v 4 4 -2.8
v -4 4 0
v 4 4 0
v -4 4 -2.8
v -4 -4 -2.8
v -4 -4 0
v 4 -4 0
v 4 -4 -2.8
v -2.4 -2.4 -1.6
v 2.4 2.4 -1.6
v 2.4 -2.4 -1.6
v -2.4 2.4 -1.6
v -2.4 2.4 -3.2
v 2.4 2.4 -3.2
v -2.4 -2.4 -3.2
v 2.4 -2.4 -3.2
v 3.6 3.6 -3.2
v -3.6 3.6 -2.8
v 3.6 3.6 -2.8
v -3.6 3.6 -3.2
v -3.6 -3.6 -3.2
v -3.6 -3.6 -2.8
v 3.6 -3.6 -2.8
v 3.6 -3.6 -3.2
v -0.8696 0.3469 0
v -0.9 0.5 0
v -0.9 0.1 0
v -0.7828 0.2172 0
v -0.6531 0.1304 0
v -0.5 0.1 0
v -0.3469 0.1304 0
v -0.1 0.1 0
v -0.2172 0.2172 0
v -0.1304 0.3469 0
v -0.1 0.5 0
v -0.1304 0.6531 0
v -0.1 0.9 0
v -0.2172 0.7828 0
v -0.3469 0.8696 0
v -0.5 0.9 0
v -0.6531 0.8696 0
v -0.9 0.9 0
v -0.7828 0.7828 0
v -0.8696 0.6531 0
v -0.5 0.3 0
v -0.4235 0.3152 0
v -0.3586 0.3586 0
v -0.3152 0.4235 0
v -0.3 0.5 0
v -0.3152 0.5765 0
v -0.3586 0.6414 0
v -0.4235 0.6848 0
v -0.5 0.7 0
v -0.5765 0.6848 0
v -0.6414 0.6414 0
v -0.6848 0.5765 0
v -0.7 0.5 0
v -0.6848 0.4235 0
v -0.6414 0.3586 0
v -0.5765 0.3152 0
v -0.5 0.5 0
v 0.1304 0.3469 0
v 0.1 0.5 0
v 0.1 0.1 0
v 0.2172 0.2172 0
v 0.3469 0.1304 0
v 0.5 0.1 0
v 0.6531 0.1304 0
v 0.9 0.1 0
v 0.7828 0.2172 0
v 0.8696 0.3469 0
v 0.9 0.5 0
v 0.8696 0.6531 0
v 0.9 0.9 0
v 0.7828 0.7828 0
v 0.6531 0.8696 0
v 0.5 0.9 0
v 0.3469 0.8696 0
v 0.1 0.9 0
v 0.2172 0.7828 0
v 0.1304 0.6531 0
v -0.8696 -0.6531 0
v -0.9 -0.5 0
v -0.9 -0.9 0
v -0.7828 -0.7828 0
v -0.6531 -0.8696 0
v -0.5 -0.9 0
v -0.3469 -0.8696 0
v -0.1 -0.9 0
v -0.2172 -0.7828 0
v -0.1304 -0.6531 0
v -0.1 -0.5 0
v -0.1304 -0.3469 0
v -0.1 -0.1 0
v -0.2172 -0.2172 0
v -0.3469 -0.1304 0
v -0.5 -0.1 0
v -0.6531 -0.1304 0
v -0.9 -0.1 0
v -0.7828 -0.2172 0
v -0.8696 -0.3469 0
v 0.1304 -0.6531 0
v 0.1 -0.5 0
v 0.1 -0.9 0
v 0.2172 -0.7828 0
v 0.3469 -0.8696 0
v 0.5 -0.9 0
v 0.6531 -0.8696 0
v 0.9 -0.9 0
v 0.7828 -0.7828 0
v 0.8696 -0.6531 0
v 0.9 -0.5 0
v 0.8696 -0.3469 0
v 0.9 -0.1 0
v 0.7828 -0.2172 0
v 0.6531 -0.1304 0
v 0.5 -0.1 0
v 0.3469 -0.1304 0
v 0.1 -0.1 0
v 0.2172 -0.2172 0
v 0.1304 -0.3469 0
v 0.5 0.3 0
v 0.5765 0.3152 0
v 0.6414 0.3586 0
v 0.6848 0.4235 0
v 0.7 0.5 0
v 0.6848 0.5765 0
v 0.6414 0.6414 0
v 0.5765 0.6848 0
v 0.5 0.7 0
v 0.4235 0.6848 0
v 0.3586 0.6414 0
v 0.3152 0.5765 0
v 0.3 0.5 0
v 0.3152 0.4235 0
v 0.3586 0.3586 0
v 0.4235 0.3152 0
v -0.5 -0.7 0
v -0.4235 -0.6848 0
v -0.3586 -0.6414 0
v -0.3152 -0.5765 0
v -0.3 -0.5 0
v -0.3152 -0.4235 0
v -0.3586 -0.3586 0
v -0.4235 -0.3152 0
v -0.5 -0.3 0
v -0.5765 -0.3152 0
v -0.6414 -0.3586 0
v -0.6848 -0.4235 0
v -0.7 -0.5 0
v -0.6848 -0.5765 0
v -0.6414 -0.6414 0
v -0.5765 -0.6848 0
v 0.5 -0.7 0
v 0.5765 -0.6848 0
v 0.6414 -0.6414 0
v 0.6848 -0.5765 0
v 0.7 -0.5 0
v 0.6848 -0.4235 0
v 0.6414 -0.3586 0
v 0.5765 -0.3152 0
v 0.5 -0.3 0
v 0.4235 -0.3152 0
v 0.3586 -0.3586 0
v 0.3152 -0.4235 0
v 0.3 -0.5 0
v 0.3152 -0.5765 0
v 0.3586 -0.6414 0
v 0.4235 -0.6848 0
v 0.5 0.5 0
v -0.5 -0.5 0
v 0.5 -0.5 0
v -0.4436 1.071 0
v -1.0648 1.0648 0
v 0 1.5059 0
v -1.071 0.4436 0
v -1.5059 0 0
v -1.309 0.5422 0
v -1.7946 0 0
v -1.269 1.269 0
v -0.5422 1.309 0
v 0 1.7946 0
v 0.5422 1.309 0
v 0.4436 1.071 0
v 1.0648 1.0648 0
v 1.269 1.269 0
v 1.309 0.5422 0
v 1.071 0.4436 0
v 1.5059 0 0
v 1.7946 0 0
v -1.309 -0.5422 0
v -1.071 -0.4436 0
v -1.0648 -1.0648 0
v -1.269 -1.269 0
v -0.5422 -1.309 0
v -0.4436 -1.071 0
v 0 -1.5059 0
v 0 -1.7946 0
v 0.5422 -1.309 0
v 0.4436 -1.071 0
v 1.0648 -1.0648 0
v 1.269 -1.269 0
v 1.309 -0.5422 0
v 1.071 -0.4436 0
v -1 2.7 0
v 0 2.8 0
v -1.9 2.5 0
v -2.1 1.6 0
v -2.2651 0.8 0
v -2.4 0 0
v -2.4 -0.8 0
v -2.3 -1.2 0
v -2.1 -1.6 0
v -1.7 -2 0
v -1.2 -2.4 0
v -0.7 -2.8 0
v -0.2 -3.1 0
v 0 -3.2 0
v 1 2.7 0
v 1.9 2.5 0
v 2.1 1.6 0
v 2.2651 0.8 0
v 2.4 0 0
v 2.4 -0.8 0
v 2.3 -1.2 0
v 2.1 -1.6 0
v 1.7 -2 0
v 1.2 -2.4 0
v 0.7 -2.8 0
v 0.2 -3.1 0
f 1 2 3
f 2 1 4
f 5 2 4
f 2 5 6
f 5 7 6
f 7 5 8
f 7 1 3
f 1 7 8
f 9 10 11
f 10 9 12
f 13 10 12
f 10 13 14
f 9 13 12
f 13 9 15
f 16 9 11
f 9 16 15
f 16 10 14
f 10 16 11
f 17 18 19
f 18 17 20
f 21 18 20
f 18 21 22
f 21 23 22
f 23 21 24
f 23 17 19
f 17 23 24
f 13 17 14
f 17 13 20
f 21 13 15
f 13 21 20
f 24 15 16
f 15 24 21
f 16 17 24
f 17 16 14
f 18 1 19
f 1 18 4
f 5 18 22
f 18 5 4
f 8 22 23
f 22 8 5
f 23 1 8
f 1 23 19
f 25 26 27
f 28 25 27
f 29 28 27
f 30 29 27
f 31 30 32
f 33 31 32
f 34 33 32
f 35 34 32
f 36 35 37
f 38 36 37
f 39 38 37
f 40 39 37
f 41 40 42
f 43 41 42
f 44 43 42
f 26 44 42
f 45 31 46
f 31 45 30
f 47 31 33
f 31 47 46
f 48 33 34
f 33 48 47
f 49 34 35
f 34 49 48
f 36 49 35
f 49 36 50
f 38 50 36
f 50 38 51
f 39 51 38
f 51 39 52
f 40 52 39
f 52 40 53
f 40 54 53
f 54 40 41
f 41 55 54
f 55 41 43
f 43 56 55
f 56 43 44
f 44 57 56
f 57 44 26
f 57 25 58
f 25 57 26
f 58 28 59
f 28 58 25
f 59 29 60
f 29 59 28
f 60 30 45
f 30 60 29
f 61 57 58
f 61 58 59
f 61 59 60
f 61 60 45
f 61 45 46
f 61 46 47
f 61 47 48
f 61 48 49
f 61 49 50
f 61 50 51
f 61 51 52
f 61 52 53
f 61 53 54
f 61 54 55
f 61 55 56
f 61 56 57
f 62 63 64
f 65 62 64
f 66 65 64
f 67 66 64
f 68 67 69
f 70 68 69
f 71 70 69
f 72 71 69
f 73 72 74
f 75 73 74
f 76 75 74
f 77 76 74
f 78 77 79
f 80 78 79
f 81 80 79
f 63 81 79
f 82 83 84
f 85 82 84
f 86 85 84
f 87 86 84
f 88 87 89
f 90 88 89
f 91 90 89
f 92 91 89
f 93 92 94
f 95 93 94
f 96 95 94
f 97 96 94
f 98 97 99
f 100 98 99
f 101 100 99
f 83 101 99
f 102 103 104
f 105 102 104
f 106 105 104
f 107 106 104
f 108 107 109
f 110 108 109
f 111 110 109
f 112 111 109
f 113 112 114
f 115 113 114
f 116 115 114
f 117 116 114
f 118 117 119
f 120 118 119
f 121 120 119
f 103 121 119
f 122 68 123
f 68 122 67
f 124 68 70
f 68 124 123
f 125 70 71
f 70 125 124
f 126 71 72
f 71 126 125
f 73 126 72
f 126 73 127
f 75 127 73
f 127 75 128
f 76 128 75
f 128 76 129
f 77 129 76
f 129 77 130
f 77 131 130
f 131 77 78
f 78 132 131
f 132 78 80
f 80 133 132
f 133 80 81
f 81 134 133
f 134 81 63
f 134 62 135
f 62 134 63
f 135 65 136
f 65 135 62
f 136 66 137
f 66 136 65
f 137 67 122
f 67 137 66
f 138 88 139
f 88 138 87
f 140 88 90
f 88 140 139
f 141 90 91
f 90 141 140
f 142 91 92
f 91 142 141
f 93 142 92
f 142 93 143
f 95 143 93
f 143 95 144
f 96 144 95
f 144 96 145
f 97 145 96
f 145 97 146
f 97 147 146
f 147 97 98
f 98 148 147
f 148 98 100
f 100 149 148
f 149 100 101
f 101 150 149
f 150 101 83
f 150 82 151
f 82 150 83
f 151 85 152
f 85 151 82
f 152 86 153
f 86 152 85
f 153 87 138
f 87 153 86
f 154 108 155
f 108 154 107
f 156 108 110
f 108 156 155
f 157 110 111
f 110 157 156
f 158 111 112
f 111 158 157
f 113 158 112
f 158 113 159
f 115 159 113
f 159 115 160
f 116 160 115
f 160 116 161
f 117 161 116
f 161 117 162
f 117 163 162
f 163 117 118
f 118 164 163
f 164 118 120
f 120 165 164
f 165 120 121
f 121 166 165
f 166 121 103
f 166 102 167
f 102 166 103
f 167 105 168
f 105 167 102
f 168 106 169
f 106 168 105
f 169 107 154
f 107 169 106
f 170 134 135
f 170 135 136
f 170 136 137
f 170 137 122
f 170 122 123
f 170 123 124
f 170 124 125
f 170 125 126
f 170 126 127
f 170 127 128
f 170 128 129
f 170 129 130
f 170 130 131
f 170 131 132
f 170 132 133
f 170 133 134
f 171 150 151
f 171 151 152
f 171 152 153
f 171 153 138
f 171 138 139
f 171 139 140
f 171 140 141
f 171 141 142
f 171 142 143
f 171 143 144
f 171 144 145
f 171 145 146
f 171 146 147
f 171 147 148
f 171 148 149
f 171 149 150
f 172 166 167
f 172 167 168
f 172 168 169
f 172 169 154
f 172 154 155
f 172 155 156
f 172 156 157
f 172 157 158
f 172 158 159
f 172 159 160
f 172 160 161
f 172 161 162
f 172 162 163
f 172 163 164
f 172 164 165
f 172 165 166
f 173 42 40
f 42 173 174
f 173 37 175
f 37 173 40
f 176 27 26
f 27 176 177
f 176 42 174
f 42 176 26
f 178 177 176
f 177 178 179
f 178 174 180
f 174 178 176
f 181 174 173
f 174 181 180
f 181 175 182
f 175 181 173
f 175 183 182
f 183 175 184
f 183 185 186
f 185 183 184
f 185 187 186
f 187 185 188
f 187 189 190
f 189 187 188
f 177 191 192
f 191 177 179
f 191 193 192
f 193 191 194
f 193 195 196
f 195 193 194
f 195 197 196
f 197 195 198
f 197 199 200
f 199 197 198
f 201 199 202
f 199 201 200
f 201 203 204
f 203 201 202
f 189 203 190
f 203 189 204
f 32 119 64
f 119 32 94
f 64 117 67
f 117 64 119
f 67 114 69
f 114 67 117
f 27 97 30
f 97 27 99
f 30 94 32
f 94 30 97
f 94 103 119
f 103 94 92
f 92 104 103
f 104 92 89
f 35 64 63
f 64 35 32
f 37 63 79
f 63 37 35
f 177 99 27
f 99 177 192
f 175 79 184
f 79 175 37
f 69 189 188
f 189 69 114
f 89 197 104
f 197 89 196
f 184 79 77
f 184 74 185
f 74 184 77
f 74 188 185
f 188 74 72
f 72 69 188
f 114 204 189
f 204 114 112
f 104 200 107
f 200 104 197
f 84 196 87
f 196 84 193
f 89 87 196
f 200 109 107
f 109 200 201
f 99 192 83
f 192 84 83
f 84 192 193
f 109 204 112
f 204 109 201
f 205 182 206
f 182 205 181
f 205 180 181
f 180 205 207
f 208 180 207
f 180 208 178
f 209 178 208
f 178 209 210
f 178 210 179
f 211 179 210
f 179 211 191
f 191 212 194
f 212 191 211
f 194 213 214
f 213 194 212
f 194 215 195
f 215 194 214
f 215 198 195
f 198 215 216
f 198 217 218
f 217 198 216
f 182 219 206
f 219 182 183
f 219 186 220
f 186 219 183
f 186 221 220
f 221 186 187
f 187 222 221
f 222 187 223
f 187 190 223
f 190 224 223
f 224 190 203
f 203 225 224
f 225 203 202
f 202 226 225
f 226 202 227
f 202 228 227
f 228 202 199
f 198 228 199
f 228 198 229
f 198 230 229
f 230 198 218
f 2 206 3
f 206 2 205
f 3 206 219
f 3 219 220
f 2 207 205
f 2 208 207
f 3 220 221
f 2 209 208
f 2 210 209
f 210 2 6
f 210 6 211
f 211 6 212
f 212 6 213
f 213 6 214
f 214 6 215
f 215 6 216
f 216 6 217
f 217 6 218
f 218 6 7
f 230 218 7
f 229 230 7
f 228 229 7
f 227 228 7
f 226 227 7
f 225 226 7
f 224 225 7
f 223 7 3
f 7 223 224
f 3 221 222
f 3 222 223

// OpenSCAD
// file: ../p/box5.scad
use <../lib.scad>
function ldraw_lib__box5() = [
// 0 Box with 5 Faces and All Edges
// 0 Name: box5.dat
// 0 Author: James Jessiman
// 0 !LDRAW_ORG Primitive UPDATE 2012-01
// 0 !LICENSE Licensed under CC BY 4.0 : see CAreadme.txt
// 
// 0 BFC CERTIFY CCW
  [0,"BFC","CERTIFY"],
  [0,"BFC","CCW"],
// 
// 0 !HISTORY 2002-04-03 [sbliss] Modified for BFC compliance
// 0 !HISTORY 2002-04-25 [PTadmin] Official Update 2002-02
// 0 !HISTORY 2007-06-24 [PTadmin] Header formatted for Contributor Agreement
// 0 !HISTORY 2008-07-01 [PTadmin] Official Update 2008-01
// 0 !HISTORY 2012-02-16 [Philo] Changed to CCW
// 0 !HISTORY 2012-03-30 [PTadmin] Official Update 2012-01
// 
// 
// 2 24 1 1 1 -1 1 1
  [2,24,1,1,1,-1,1,1],
// 2 24 -1 1 1 -1 1 -1
  [2,24,-1,1,1,-1,1,-1],
// 2 24 -1 1 -1 1 1 -1
  [2,24,-1,1,-1,1,1,-1],
// 2 24 1 1 -1 1 1 1
  [2,24,1,1,-1,1,1,1],
// 2 24 1 0 1 -1 0 1
  [2,24,1,0,1,-1,0,1],
// 2 24 -1 0 1 -1 0 -1
  [2,24,-1,0,1,-1,0,-1],
// 2 24 -1 0 -1 1 0 -1
  [2,24,-1,0,-1,1,0,-1],
// 2 24 1 0 -1 1 0 1
  [2,24,1,0,-1,1,0,1],
// 2 24 1 0 1 1 1 1
  [2,24,1,0,1,1,1,1],
// 2 24 -1 0 1 -1 1 1
  [2,24,-1,0,1,-1,1,1],
// 2 24 1 0 -1 1 1 -1
  [2,24,1,0,-1,1,1,-1],
// 2 24 -1 0 -1 -1 1 -1
  [2,24,-1,0,-1,-1,1,-1],
// 4 16 -1 1 1 1 1 1 1 1 -1 -1 1 -1
  [4,16,-1,1,1,1,1,1,1,1,-1,-1,1,-1],
// 4 16 -1 1 1 -1 0 1 1 0 1 1 1 1
  [4,16,-1,1,1,-1,0,1,1,0,1,1,1,1],
// 4 16 -1 1 -1 -1 0 -1 -1 0 1 -1 1 1
  [4,16,-1,1,-1,-1,0,-1,-1,0,1,-1,1,1],
// 4 16 1 1 -1 1 0 -1 -1 0 -1 -1 1 -1
  [4,16,1,1,-1,1,0,-1,-1,0,-1,-1,1,-1],
// 4 16 1 1 1 1 0 1 1 0 -1 1 1 -1
  [4,16,1,1,1,1,0,1,1,0,-1,1,1,-1],
];
module ldraw_lib__box5(step=0, col=false, unit=2/5, alt=false, line=0.2, solid=!$preview)
    makepoly(ldraw_lib__box5(), step=step, col=col, unit=unit, alt=alt, line=line, solid=solid);
ldraw_lib__box5(line=0.2);
// file: ../p/box4.scad
use <../lib.scad>
function ldraw_lib__box4() = [
// 0 Box with 4 Faces (2 Parallel Pairs) and All Edges
// 0 Name: box4.dat
// 0 Author: James Jessiman
// 0 !LDRAW_ORG Primitive UPDATE 2012-01
// 0 !LICENSE Licensed under CC BY 4.0 : see CAreadme.txt
// 
// 0 BFC CERTIFY CCW
  [0,"BFC","CERTIFY"],
  [0,"BFC","CCW"],
// 
// 0 !HISTORY 2002-04-03 [sbliss] Modified for BFC compliance
// 0 !HISTORY 2002-04-25 [PTadmin] Official Update 2002-02
// 0 !HISTORY 2007-06-24 [PTadmin] Header formatted for Contributor Agreement
// 0 !HISTORY 2008-07-01 [PTadmin] Official Update 2008-01
// 0 !HISTORY 2012-02-16 [Philo] Changed to CCW
// 0 !HISTORY 2012-03-30 [PTadmin] Official Update 2012-01
// 
// 
// 2 24 1 1 1 -1 1 1
  [2,24,1,1,1,-1,1,1],
// 2 24 -1 1 1 -1 1 -1
  [2,24,-1,1,1,-1,1,-1],
// 2 24 -1 1 -1 1 1 -1
  [2,24,-1,1,-1,1,1,-1],
// 2 24 1 1 -1 1 1 1
  [2,24,1,1,-1,1,1,1],
// 2 24 1 0 1 -1 0 1
  [2,24,1,0,1,-1,0,1],
// 2 24 -1 0 1 -1 0 -1
  [2,24,-1,0,1,-1,0,-1],
// 2 24 -1 0 -1 1 0 -1
  [2,24,-1,0,-1,1,0,-1],
// 2 24 1 0 -1 1 0 1
  [2,24,1,0,-1,1,0,1],
// 2 24 1 0 1 1 1 1
  [2,24,1,0,1,1,1,1],
// 2 24 -1 0 1 -1 1 1
  [2,24,-1,0,1,-1,1,1],
// 2 24 1 0 -1 1 1 -1
  [2,24,1,0,-1,1,1,-1],
// 2 24 -1 0 -1 -1 1 -1
  [2,24,-1,0,-1,-1,1,-1],
// 4 16 -1 1 1 -1 0 1 1 0 1 1 1 1
  [4,16,-1,1,1,-1,0,1,1,0,1,1,1,1],
// 4 16 -1 1 -1 -1 0 -1 -1 0 1 -1 1 1
  [4,16,-1,1,-1,-1,0,-1,-1,0,1,-1,1,1],
// 4 16 1 1 -1 1 0 -1 -1 0 -1 -1 1 -1
  [4,16,1,1,-1,1,0,-1,-1,0,-1,-1,1,-1],
// 4 16 1 1 1 1 0 1 1 0 -1 1 1 -1
  [4,16,1,1,1,1,0,1,1,0,-1,1,1,-1],
];
module ldraw_lib__box4(step=0, col=false, unit=2/5, alt=false, line=0.2, solid=!$preview)
    makepoly(ldraw_lib__box4(), step=step, col=col, unit=unit, alt=alt, line=line, solid=solid);
ldraw_lib__box4(line=0.2);
// file: ../p/4-4ring1.scad
use <../lib.scad>
function ldraw_lib__4_4ring1() = [
// 0 Ring  1 x 1.0
// 0 Name: 4-4ring1.dat
// 0 Author: James Jessiman
// 0 !LDRAW_ORG Primitive UPDATE 2009-01
// 0 !LICENSE Licensed under CC BY 2.0 and CC BY 4.0 : see CAreadme.txt
// 
// 0 BFC CERTIFY CCW
  [0,"BFC","CERTIFY"],
  [0,"BFC","CCW"],
// 
// 0 !HISTORY 1998-12-15 [PTadmin] Official Update 1998-10
// 0 !HISTORY 2002-04-08 [BrickCaster] Modified for BFC compliance
// 0 !HISTORY 2002-04-25 [PTadmin] Official Update 2002-02
// 0 !HISTORY 2007-06-24 [PTadmin] Header formatted for Contributor Agreement
// 0 !HISTORY 2008-07-01 [PTadmin] Official Update 2008-01
// 0 !HISTORY 2008-08-26 [cwdee] Switch polygon winding and rename
// 0 !HISTORY 2009-05-02 [PTadmin] Official Update 2009-01
// 
// 
// 4 16 -0.7654 0 1.8478 -0.3827 0 0.9239 0 0 1 0 0 2
  [4,16,-0.7654,0,1.8478,-0.3827,0,0.9239,0,0,1,0,0,2],
// 4 16 -1.4142 0 1.4142 -0.7071 0 0.7071 -0.3827 0 0.9239 -0.7654 0 1.8478
  [4,16,-1.4142,0,1.4142,-0.7071,0,0.7071,-0.3827,0,0.9239,-0.7654,0,1.8478],
// 4 16 -1.8478 0 0.7654 -0.9239 0 0.3827 -0.7071 0 0.7071 -1.4142 0 1.41420
  [4,16,-1.8478,0,0.7654,-0.9239,0,0.3827,-0.7071,0,0.7071,-1.4142,0,1.41420],
// 4 16 -2 0 0 -1 0 0 -0.9239 0 0.3827 -1.8478 0 0.7654
  [4,16,-2,0,0,-1,0,0,-0.9239,0,0.3827,-1.8478,0,0.7654],
// 4 16 -1.8478 0 -0.7654 -0.9239 0 -0.3827 -1 0 0 -2 0 0
  [4,16,-1.8478,0,-0.7654,-0.9239,0,-0.3827,-1,0,0,-2,0,0],
// 4 16 -1.4142 0 -1.4142 -0.7071 0 -0.7071 -0.9239 0 -0.3827 -1.8478 0 -0.7654
  [4,16,-1.4142,0,-1.4142,-0.7071,0,-0.7071,-0.9239,0,-0.3827,-1.8478,0,-0.7654],
// 4 16 -0.7654 0 -1.8478 -0.3827 0 -0.9239 -0.7071 0 -0.7071 -1.4142 0 -1.4142
  [4,16,-0.7654,0,-1.8478,-0.3827,0,-0.9239,-0.7071,0,-0.7071,-1.4142,0,-1.4142],
// 4 16 0 0 -2 0 0 -1 -0.3827 0 -0.9239 -0.7654 0 -1.8478
  [4,16,0,0,-2,0,0,-1,-0.3827,0,-0.9239,-0.7654,0,-1.8478],
// 4 16 0.7654 0 -1.8478 0.3827 0 -0.9239 0 0 -1 0 0 -2
  [4,16,0.7654,0,-1.8478,0.3827,0,-0.9239,0,0,-1,0,0,-2],
// 4 16 1.4142 0 -1.4142 0.7071 0 -0.7071 0.3827 0 -0.9239 0.7654 0 -1.8478
  [4,16,1.4142,0,-1.4142,0.7071,0,-0.7071,0.3827,0,-0.9239,0.7654,0,-1.8478],
// 4 16 1.8478 0 -0.7654 0.9239 0 -0.3827 0.7071 0 -0.7071 1.4142 0 -1.4142
  [4,16,1.8478,0,-0.7654,0.9239,0,-0.3827,0.7071,0,-0.7071,1.4142,0,-1.4142],
// 4 16 2 0 0 1 0 0 0.9239 0 -0.3827 1.8478 0 -0.7654
  [4,16,2,0,0,1,0,0,0.9239,0,-0.3827,1.8478,0,-0.7654],
// 4 16 1.8478 0 0.7654 0.9239 0 0.3827 1 0 0 2 0 0
  [4,16,1.8478,0,0.7654,0.9239,0,0.3827,1,0,0,2,0,0],
// 4 16 1.4142 0 1.4142 0.7071 0 0.7071 0.9239 0 0.3827 1.8478 0 0.7654
  [4,16,1.4142,0,1.4142,0.7071,0,0.7071,0.9239,0,0.3827,1.8478,0,0.7654],
// 4 16 0.7654 0 1.8478 0.3827 0 0.9239 0.7071 0 0.7071 1.4142 0 1.4142
  [4,16,0.7654,0,1.8478,0.3827,0,0.9239,0.7071,0,0.7071,1.4142,0,1.4142],
// 4 16 0 0 2 0 0 1 0.3827 0 0.9239 0.7654 0 1.8478
  [4,16,0,0,2,0,0,1,0.3827,0,0.9239,0.7654,0,1.8478],
// 0
];
module ldraw_lib__4_4ring1(step=0, col=false, unit=2/5, alt=false, line=0.2, solid=!$preview)
    makepoly(ldraw_lib__4_4ring1(), step=step, col=col, unit=unit, alt=alt, line=line, solid=solid);
ldraw_lib__4_4ring1(line=0.2);
// file: ../p/4-4ndis.scad
use <../lib.scad>
function ldraw_lib__4_4ndis() = [
// 0 Disc Negative 1.0
// 0 Name: 4-4ndis.dat
// 0 Author: James Jessiman
// 0 !LDRAW_ORG Primitive UPDATE 2012-01
// 0 !LICENSE Licensed under CC BY 4.0 : see CAreadme.txt
// 
// 0 BFC CERTIFY CCW
  [0,"BFC","CERTIFY"],
  [0,"BFC","CCW"],
// 
// 0 !HISTORY 2002-03-23 [sbliss] Added BFC statement; compacted code
// 0 !HISTORY 2002-04-25 [PTadmin] Official Update 2002-02
// 0 !HISTORY 2007-06-24 [PTadmin] Header formatted for Contributor Agreement
// 0 !HISTORY 2008-07-01 [PTadmin] Official Update 2008-01
// 0 !HISTORY 2012-02-16 [Philo] Changed to CCW
// 0 !HISTORY 2012-03-30 [PTadmin] Official Update 2012-01
// 
// 
// 3 16 0.9239 0 0.3827 1 0 0 1 0 1
  [3,16,0.9239,0,0.3827,1,0,0,1,0,1],
// 3 16 0.7071 0 0.7071 0.9239 0 0.3827 1 0 1
  [3,16,0.7071,0,0.7071,0.9239,0,0.3827,1,0,1],
// 3 16 0.3827 0 0.9239 0.7071 0 0.7071 1 0 1
  [3,16,0.3827,0,0.9239,0.7071,0,0.7071,1,0,1],
// 3 16 0 0 1 0.3827 0 0.9239 1 0 1
  [3,16,0,0,1,0.3827,0,0.9239,1,0,1],
// 3 16 -0.3827 0 0.9239 0 0 1 -1 0 1
  [3,16,-0.3827,0,0.9239,0,0,1,-1,0,1],
// 3 16 -0.7071 0 0.7071 -0.3827 0 0.9239 -1 0 1
  [3,16,-0.7071,0,0.7071,-0.3827,0,0.9239,-1,0,1],
// 3 16 -0.9239 0 0.3827 -0.7071 0 0.7071 -1 0 1
  [3,16,-0.9239,0,0.3827,-0.7071,0,0.7071,-1,0,1],
// 3 16 -1 0 0 -0.9239 0 0.3827 -1 0 1
  [3,16,-1,0,0,-0.9239,0,0.3827,-1,0,1],
// 3 16 -0.9239 0 -0.3827 -1 0 0 -1 0 -1
  [3,16,-0.9239,0,-0.3827,-1,0,0,-1,0,-1],
// 3 16 -0.7071 0 -0.7071 -0.9239 0 -0.3827 -1 0 -1
  [3,16,-0.7071,0,-0.7071,-0.9239,0,-0.3827,-1,0,-1],
// 3 16 -0.3827 0 -0.9239 -0.7071 0 -0.7071 -1 0 -1
  [3,16,-0.3827,0,-0.9239,-0.7071,0,-0.7071,-1,0,-1],
// 3 16 0 0 -1 -0.3827 0 -0.9239 -1 0 -1
  [3,16,0,0,-1,-0.3827,0,-0.9239,-1,0,-1],
// 3 16 0.3827 0 -0.9239 0 0 -1 1 0 -1
  [3,16,0.3827,0,-0.9239,0,0,-1,1,0,-1],
// 3 16 0.7071 0 -0.7071 0.3827 0 -0.9239 1 0 -1
  [3,16,0.7071,0,-0.7071,0.3827,0,-0.9239,1,0,-1],
// 3 16 0.9239 0 -0.3827 0.7071 0 -0.7071 1 0 -1
  [3,16,0.9239,0,-0.3827,0.7071,0,-0.7071,1,0,-1],
// 3 16 1 0 0 0.9239 0 -0.3827 1 0 -1
  [3,16,1,0,0,0.9239,0,-0.3827,1,0,-1],
];
module ldraw_lib__4_4ndis(step=0, col=false, unit=2/5, alt=false, line=0.2, solid=!$preview)
    makepoly(ldraw_lib__4_4ndis(), step=step, col=col, unit=unit, alt=alt, line=line, solid=solid);
ldraw_lib__4_4ndis(line=0.2);
// file: ../p/4-4disc.scad
use <../lib.scad>
function ldraw_lib__4_4disc() = [
// 0 Disc 1.0
// 0 Name: 4-4disc.dat
// 0 Author: James Jessiman
// 0 !LDRAW_ORG Primitive UPDATE 2002-02
// 0 !LICENSE Licensed under CC BY 4.0 : see CAreadme.txt
// 
// 0 BFC CERTIFY CCW
  [0,"BFC","CERTIFY"],
  [0,"BFC","CCW"],
// 
// 0 !HISTORY 1998-12-15 [PTadmin] Official Update 1998-10
// 0 !HISTORY 2002-03-23 [sbliss] Added BFC statement
// 0 !HISTORY 2002-04-25 [PTadmin] Official Update 2002-02
// 0 !HISTORY 2007-06-24 [PTadmin] Header formatted for Contributor Agreement
// 0 !HISTORY 2008-07-01 [PTadmin] Official Update 2008-01
// 
// 
// 3 16 0 0 0 1 0 0 0.9239 0 0.3827
  [3,16,0,0,0,1,0,0,0.9239,0,0.3827],
// 3 16 0 0 0 0.9239 0 0.3827 0.7071 0 0.7071
  [3,16,0,0,0,0.9239,0,0.3827,0.7071,0,0.7071],
// 3 16 0 0 0 0.7071 0 0.7071 0.3827 0 0.9239
  [3,16,0,0,0,0.7071,0,0.7071,0.3827,0,0.9239],
// 3 16 0 0 0 0.3827 0 0.9239 0 0 1
  [3,16,0,0,0,0.3827,0,0.9239,0,0,1],
// 3 16 0 0 0 0 0 1 -0.3827 0 0.9239
  [3,16,0,0,0,0,0,1,-0.3827,0,0.9239],
// 3 16 0 0 0 -0.3827 0 0.9239 -0.7071 0 0.7071
  [3,16,0,0,0,-0.3827,0,0.9239,-0.7071,0,0.7071],
// 3 16 0 0 0 -0.7071 0 0.7071 -0.9239 0 0.3827
  [3,16,0,0,0,-0.7071,0,0.7071,-0.9239,0,0.3827],
// 3 16 0 0 0 -0.9239 0 0.3827 -1 0 -0
  [3,16,0,0,0,-0.9239,0,0.3827,-1,0,-0],
// 3 16 0 0 0 -1 0 -0 -0.9239 0 -0.3827
  [3,16,0,0,0,-1,0,-0,-0.9239,0,-0.3827],
// 3 16 0 0 0 -0.9239 0 -0.3827 -0.7071 0 -0.7071
  [3,16,0,0,0,-0.9239,0,-0.3827,-0.7071,0,-0.7071],
// 3 16 0 0 0 -0.7071 0 -0.7071 -0.3827 0 -0.9239
  [3,16,0,0,0,-0.7071,0,-0.7071,-0.3827,0,-0.9239],
// 3 16 0 0 0 -0.3827 0 -0.9239 0 0 -1
  [3,16,0,0,0,-0.3827,0,-0.9239,0,0,-1],
// 3 16 0 0 0 0 0 -1 0.3827 0 -0.9239
  [3,16,0,0,0,0,0,-1,0.3827,0,-0.9239],
// 3 16 0 0 0 0.3827 0 -0.9239 0.7071 0 -0.7071
  [3,16,0,0,0,0.3827,0,-0.9239,0.7071,0,-0.7071],
// 3 16 0 0 0 0.7071 0 -0.7071 0.9239 0 -0.3827
  [3,16,0,0,0,0.7071,0,-0.7071,0.9239,0,-0.3827],
// 3 16 0 0 0 0.9239 0 -0.3827 1 0 0
  [3,16,0,0,0,0.9239,0,-0.3827,1,0,0],
// 0
];
module ldraw_lib__4_4disc(step=0, col=false, unit=2/5, alt=false, line=0.2, solid=!$preview)
    makepoly(ldraw_lib__4_4disc(), step=step, col=col, unit=unit, alt=alt, line=line, solid=solid);
ldraw_lib__4_4disc(line=0.2);
// file: s/3070bs01.scad
use <../../lib.scad>
use <../../p/box4.scad>
use <../../p/box5.scad>
function ldraw_lib__s__3070bs01() = [
// 0 ~Tile  1 x  1 with Groove without Top Face
// 0 Name: s\3070bs01.dat
// 0 Author: Chris Dee [cwdee]
// 0 !LDRAW_ORG Subpart UPDATE 2009-02
// 0 !LICENSE Licensed under CC BY 4.0 : see CAreadme.txt
// 
// 0 BFC CERTIFY CCW
  [0,"BFC","CERTIFY"],
  [0,"BFC","CCW"],
// 
// 0 !HISTORY 2009-09-03 [PTadmin] Official Update 2009-02
// 
// 
// 1 16 0 0 0 10 0 0 0 7 0 0 0 10 box4.dat
  [1,16,0,0,0,10,0,0,0,7,0,0,0,10, ldraw_lib__box4()],
// 0 BFC INVERTNEXT
  [0,"BFC","INVERTNEXT"],
// 1 16 0 8 0 6 0 0 0 -4 0 0 0 6 box5.dat
  [1,16,0,8,0,6,0,0,0,-4,0,0,0,6, ldraw_lib__box5()],
// 1 16 0 7 0 9 0 0 0 1 0 0 0 9 box4.dat
  [1,16,0,7,0,9,0,0,0,1,0,0,0,9, ldraw_lib__box4()],
// 
// 4 16 9 8 9 6 8 6 -6 8 6 -9 8 9
  [4,16,9,8,9,6,8,6,-6,8,6,-9,8,9],
// 4 16 -9 8 9 -6 8 6 -6 8 -6 -9 8 -9
  [4,16,-9,8,9,-6,8,6,-6,8,-6,-9,8,-9],
// 4 16 -9 8 -9 -6 8 -6 6 8 -6 9 8 -9
  [4,16,-9,8,-9,-6,8,-6,6,8,-6,9,8,-9],
// 4 16 9 8 -9 6 8 -6 6 8 6 9 8 9
  [4,16,9,8,-9,6,8,-6,6,8,6,9,8,9],
// 
// 4 16 10 7 10 9 7 9 -9 7 9 -10 7 10
  [4,16,10,7,10,9,7,9,-9,7,9,-10,7,10],
// 4 16 -10 7 10 -9 7 9 -9 7 -9 -10 7 -10
  [4,16,-10,7,10,-9,7,9,-9,7,-9,-10,7,-10],
// 4 16 -10 7 -10 -9 7 -9 9 7 -9 10 7 -10
  [4,16,-10,7,-10,-9,7,-9,9,7,-9,10,7,-10],
// 4 16 10 7 -10 9 7 -9 9 7 9 10 7 10
  [4,16,10,7,-10,9,7,-9,9,7,9,10,7,10],
// 0
];
module ldraw_lib__s__3070bs01(step=0, col=false, unit=2/5, alt=false, line=0.2, solid=!$preview)
    makepoly(ldraw_lib__s__3070bs01(), step=step, col=col, unit=unit, alt=alt, line=line, solid=solid);
ldraw_lib__s__3070bs01(line=0.2);
// main file
use <../lib.scad>
use <s/3070bp70a.scad>
use <s/3070bs01.scad>
function ldraw_lib__3070bp70() = [
// 0 Tile  1 x  1 with Gold Badge Pattern
// 0 Name: 3070bp70.dat
// 0 Author: Nils Schmidt [BlackBrick89]
// 0 !LDRAW_ORG Part UPDATE 2012-01
// 0 !LICENSE Licensed under CC BY 4.0 : see CAreadme.txt
// 
// 0 BFC CERTIFY CCW
  [0,"BFC","CERTIFY"],
  [0,"BFC","CCW"],
// 
// 0 !KEYWORDS police, Train
// 
// 0 !HISTORY 2012-03-30 [PTadmin] Official Update 2012-01
// 
// 
// 1 16 0 0 0 1 0 0 0 1 0 0 0 1 s\3070bs01.dat
  [1,16,0,0,0,1,0,0,0,1,0,0,0,1, ldraw_lib__s__3070bs01()],
// 1 82 0 0 0 1 0 0 0 1 0 0 0 1 s\3070bp70a.dat
  [1,82,0,0,0,1,0,0,0,1,0,0,0,1, ldraw_lib__s__3070bp70a()],
// 4 0 0 0 7 10 0 10 -10 0 10 -2.5 0 6.75
  [4,0,0,0,7,10,0,10,-10,0,10,-2.5,0,6.75],
// 3 0 10 0 10 0 0 7 2.5 0 6.75
  [3,0,10,0,10,0,0,7,2.5,0,6.75],
// 3 0 10 0 10 2.5 0 6.75 4.75 0 6.25
  [3,0,10,0,10,2.5,0,6.75,4.75,0,6.25],
// 3 0 -10 0 10 -4.75 0 6.25 -2.5 0 6.75
  [3,0,-10,0,10,-4.75,0,6.25,-2.5,0,6.75],
// 3 0 -10 0 10 -5.25 0 4 -4.75 0 6.25
  [3,0,-10,0,10,-5.25,0,4,-4.75,0,6.25],
// 3 0 10 0 10 4.75 0 6.25 5.25 0 4
  [3,0,10,0,10,4.75,0,6.25,5.25,0,4],
// 3 0 -10 0 10 -5.6628 0 2 -5.25 0 4
  [3,0,-10,0,10,-5.6628,0,2,-5.25,0,4],
// 4 0 -6 0 0 -5.6628 0 2 -10 0 10 -10 0 -10
  [4,0,-6,0,0,-5.6628,0,2,-10,0,10,-10,0,-10],
// 3 0 -6 0 0 -10 0 -10 -6 0 -2
  [3,0,-6,0,0,-10,0,-10,-6,0,-2],
// 3 0 -6 0 -2 -10 0 -10 -5.75 0 -3
  [3,0,-6,0,-2,-10,0,-10,-5.75,0,-3],
// 3 0 -5.75 0 -3 -10 0 -10 -5.25 0 -4
  [3,0,-5.75,0,-3,-10,0,-10,-5.25,0,-4],
// 3 0 -5.25 0 -4 -10 0 -10 -4.25 0 -5
  [3,0,-5.25,0,-4,-10,0,-10,-4.25,0,-5],
// 3 0 -4.25 0 -5 -10 0 -10 -3 0 -6
  [3,0,-4.25,0,-5,-10,0,-10,-3,0,-6],
// 3 0 -3 0 -6 -10 0 -10 -1.75 0 -7
  [3,0,-3,0,-6,-10,0,-10,-1.75,0,-7],
// 3 0 -1.75 0 -7 -10 0 -10 -0.5 0 -7.75
  [3,0,-1.75,0,-7,-10,0,-10,-0.5,0,-7.75],
// 3 0 -0.5 0 -7.75 -10 0 -10 0 0 -8
  [3,0,-0.5,0,-7.75,-10,0,-10,0,0,-8],
// 3 0 0 0 -8 -10 0 -10 10 0 -10
  [3,0,0,0,-8,-10,0,-10,10,0,-10],
// 3 0 0.5 0 -7.75 0 0 -8 10 0 -10
  [3,0,0.5,0,-7.75,0,0,-8,10,0,-10],
// 3 0 1.75 0 -7 0.5 0 -7.75 10 0 -10
  [3,0,1.75,0,-7,0.5,0,-7.75,10,0,-10],
// 3 0 3 0 -6 1.75 0 -7 10 0 -10
  [3,0,3,0,-6,1.75,0,-7,10,0,-10],
// 3 0 4.25 0 -5 3 0 -6 10 0 -10
  [3,0,4.25,0,-5,3,0,-6,10,0,-10],
// 3 0 5.25 0 -4 4.25 0 -5 10 0 -10
  [3,0,5.25,0,-4,4.25,0,-5,10,0,-10],
// 3 0 5.75 0 -3 5.25 0 -4 10 0 -10
  [3,0,5.75,0,-3,5.25,0,-4,10,0,-10],
// 3 0 6 0 -2 5.75 0 -3 10 0 -10
  [3,0,6,0,-2,5.75,0,-3,10,0,-10],
// 4 0 6 0 0 6 0 -2 10 0 -10 10 0 10
  [4,0,6,0,0,6,0,-2,10,0,-10,10,0,10],
// 3 0 10 0 10 5.25 0 4 5.6628 0 2
  [3,0,10,0,10,5.25,0,4,5.6628,0,2],
// 3 0 10 0 10 5.6628 0 2 6 0 0
  [3,0,10,0,10,5.6628,0,2,6,0,0],
];
module ldraw_lib__3070bp70(step=0, col=false, unit=2/5, alt=false, line=0.2, solid=!$preview)
    makepoly(ldraw_lib__3070bp70(), step=step, col=col, unit=unit, alt=alt, line=line, solid=solid);
ldraw_lib__3070bp70(line=0.2);
